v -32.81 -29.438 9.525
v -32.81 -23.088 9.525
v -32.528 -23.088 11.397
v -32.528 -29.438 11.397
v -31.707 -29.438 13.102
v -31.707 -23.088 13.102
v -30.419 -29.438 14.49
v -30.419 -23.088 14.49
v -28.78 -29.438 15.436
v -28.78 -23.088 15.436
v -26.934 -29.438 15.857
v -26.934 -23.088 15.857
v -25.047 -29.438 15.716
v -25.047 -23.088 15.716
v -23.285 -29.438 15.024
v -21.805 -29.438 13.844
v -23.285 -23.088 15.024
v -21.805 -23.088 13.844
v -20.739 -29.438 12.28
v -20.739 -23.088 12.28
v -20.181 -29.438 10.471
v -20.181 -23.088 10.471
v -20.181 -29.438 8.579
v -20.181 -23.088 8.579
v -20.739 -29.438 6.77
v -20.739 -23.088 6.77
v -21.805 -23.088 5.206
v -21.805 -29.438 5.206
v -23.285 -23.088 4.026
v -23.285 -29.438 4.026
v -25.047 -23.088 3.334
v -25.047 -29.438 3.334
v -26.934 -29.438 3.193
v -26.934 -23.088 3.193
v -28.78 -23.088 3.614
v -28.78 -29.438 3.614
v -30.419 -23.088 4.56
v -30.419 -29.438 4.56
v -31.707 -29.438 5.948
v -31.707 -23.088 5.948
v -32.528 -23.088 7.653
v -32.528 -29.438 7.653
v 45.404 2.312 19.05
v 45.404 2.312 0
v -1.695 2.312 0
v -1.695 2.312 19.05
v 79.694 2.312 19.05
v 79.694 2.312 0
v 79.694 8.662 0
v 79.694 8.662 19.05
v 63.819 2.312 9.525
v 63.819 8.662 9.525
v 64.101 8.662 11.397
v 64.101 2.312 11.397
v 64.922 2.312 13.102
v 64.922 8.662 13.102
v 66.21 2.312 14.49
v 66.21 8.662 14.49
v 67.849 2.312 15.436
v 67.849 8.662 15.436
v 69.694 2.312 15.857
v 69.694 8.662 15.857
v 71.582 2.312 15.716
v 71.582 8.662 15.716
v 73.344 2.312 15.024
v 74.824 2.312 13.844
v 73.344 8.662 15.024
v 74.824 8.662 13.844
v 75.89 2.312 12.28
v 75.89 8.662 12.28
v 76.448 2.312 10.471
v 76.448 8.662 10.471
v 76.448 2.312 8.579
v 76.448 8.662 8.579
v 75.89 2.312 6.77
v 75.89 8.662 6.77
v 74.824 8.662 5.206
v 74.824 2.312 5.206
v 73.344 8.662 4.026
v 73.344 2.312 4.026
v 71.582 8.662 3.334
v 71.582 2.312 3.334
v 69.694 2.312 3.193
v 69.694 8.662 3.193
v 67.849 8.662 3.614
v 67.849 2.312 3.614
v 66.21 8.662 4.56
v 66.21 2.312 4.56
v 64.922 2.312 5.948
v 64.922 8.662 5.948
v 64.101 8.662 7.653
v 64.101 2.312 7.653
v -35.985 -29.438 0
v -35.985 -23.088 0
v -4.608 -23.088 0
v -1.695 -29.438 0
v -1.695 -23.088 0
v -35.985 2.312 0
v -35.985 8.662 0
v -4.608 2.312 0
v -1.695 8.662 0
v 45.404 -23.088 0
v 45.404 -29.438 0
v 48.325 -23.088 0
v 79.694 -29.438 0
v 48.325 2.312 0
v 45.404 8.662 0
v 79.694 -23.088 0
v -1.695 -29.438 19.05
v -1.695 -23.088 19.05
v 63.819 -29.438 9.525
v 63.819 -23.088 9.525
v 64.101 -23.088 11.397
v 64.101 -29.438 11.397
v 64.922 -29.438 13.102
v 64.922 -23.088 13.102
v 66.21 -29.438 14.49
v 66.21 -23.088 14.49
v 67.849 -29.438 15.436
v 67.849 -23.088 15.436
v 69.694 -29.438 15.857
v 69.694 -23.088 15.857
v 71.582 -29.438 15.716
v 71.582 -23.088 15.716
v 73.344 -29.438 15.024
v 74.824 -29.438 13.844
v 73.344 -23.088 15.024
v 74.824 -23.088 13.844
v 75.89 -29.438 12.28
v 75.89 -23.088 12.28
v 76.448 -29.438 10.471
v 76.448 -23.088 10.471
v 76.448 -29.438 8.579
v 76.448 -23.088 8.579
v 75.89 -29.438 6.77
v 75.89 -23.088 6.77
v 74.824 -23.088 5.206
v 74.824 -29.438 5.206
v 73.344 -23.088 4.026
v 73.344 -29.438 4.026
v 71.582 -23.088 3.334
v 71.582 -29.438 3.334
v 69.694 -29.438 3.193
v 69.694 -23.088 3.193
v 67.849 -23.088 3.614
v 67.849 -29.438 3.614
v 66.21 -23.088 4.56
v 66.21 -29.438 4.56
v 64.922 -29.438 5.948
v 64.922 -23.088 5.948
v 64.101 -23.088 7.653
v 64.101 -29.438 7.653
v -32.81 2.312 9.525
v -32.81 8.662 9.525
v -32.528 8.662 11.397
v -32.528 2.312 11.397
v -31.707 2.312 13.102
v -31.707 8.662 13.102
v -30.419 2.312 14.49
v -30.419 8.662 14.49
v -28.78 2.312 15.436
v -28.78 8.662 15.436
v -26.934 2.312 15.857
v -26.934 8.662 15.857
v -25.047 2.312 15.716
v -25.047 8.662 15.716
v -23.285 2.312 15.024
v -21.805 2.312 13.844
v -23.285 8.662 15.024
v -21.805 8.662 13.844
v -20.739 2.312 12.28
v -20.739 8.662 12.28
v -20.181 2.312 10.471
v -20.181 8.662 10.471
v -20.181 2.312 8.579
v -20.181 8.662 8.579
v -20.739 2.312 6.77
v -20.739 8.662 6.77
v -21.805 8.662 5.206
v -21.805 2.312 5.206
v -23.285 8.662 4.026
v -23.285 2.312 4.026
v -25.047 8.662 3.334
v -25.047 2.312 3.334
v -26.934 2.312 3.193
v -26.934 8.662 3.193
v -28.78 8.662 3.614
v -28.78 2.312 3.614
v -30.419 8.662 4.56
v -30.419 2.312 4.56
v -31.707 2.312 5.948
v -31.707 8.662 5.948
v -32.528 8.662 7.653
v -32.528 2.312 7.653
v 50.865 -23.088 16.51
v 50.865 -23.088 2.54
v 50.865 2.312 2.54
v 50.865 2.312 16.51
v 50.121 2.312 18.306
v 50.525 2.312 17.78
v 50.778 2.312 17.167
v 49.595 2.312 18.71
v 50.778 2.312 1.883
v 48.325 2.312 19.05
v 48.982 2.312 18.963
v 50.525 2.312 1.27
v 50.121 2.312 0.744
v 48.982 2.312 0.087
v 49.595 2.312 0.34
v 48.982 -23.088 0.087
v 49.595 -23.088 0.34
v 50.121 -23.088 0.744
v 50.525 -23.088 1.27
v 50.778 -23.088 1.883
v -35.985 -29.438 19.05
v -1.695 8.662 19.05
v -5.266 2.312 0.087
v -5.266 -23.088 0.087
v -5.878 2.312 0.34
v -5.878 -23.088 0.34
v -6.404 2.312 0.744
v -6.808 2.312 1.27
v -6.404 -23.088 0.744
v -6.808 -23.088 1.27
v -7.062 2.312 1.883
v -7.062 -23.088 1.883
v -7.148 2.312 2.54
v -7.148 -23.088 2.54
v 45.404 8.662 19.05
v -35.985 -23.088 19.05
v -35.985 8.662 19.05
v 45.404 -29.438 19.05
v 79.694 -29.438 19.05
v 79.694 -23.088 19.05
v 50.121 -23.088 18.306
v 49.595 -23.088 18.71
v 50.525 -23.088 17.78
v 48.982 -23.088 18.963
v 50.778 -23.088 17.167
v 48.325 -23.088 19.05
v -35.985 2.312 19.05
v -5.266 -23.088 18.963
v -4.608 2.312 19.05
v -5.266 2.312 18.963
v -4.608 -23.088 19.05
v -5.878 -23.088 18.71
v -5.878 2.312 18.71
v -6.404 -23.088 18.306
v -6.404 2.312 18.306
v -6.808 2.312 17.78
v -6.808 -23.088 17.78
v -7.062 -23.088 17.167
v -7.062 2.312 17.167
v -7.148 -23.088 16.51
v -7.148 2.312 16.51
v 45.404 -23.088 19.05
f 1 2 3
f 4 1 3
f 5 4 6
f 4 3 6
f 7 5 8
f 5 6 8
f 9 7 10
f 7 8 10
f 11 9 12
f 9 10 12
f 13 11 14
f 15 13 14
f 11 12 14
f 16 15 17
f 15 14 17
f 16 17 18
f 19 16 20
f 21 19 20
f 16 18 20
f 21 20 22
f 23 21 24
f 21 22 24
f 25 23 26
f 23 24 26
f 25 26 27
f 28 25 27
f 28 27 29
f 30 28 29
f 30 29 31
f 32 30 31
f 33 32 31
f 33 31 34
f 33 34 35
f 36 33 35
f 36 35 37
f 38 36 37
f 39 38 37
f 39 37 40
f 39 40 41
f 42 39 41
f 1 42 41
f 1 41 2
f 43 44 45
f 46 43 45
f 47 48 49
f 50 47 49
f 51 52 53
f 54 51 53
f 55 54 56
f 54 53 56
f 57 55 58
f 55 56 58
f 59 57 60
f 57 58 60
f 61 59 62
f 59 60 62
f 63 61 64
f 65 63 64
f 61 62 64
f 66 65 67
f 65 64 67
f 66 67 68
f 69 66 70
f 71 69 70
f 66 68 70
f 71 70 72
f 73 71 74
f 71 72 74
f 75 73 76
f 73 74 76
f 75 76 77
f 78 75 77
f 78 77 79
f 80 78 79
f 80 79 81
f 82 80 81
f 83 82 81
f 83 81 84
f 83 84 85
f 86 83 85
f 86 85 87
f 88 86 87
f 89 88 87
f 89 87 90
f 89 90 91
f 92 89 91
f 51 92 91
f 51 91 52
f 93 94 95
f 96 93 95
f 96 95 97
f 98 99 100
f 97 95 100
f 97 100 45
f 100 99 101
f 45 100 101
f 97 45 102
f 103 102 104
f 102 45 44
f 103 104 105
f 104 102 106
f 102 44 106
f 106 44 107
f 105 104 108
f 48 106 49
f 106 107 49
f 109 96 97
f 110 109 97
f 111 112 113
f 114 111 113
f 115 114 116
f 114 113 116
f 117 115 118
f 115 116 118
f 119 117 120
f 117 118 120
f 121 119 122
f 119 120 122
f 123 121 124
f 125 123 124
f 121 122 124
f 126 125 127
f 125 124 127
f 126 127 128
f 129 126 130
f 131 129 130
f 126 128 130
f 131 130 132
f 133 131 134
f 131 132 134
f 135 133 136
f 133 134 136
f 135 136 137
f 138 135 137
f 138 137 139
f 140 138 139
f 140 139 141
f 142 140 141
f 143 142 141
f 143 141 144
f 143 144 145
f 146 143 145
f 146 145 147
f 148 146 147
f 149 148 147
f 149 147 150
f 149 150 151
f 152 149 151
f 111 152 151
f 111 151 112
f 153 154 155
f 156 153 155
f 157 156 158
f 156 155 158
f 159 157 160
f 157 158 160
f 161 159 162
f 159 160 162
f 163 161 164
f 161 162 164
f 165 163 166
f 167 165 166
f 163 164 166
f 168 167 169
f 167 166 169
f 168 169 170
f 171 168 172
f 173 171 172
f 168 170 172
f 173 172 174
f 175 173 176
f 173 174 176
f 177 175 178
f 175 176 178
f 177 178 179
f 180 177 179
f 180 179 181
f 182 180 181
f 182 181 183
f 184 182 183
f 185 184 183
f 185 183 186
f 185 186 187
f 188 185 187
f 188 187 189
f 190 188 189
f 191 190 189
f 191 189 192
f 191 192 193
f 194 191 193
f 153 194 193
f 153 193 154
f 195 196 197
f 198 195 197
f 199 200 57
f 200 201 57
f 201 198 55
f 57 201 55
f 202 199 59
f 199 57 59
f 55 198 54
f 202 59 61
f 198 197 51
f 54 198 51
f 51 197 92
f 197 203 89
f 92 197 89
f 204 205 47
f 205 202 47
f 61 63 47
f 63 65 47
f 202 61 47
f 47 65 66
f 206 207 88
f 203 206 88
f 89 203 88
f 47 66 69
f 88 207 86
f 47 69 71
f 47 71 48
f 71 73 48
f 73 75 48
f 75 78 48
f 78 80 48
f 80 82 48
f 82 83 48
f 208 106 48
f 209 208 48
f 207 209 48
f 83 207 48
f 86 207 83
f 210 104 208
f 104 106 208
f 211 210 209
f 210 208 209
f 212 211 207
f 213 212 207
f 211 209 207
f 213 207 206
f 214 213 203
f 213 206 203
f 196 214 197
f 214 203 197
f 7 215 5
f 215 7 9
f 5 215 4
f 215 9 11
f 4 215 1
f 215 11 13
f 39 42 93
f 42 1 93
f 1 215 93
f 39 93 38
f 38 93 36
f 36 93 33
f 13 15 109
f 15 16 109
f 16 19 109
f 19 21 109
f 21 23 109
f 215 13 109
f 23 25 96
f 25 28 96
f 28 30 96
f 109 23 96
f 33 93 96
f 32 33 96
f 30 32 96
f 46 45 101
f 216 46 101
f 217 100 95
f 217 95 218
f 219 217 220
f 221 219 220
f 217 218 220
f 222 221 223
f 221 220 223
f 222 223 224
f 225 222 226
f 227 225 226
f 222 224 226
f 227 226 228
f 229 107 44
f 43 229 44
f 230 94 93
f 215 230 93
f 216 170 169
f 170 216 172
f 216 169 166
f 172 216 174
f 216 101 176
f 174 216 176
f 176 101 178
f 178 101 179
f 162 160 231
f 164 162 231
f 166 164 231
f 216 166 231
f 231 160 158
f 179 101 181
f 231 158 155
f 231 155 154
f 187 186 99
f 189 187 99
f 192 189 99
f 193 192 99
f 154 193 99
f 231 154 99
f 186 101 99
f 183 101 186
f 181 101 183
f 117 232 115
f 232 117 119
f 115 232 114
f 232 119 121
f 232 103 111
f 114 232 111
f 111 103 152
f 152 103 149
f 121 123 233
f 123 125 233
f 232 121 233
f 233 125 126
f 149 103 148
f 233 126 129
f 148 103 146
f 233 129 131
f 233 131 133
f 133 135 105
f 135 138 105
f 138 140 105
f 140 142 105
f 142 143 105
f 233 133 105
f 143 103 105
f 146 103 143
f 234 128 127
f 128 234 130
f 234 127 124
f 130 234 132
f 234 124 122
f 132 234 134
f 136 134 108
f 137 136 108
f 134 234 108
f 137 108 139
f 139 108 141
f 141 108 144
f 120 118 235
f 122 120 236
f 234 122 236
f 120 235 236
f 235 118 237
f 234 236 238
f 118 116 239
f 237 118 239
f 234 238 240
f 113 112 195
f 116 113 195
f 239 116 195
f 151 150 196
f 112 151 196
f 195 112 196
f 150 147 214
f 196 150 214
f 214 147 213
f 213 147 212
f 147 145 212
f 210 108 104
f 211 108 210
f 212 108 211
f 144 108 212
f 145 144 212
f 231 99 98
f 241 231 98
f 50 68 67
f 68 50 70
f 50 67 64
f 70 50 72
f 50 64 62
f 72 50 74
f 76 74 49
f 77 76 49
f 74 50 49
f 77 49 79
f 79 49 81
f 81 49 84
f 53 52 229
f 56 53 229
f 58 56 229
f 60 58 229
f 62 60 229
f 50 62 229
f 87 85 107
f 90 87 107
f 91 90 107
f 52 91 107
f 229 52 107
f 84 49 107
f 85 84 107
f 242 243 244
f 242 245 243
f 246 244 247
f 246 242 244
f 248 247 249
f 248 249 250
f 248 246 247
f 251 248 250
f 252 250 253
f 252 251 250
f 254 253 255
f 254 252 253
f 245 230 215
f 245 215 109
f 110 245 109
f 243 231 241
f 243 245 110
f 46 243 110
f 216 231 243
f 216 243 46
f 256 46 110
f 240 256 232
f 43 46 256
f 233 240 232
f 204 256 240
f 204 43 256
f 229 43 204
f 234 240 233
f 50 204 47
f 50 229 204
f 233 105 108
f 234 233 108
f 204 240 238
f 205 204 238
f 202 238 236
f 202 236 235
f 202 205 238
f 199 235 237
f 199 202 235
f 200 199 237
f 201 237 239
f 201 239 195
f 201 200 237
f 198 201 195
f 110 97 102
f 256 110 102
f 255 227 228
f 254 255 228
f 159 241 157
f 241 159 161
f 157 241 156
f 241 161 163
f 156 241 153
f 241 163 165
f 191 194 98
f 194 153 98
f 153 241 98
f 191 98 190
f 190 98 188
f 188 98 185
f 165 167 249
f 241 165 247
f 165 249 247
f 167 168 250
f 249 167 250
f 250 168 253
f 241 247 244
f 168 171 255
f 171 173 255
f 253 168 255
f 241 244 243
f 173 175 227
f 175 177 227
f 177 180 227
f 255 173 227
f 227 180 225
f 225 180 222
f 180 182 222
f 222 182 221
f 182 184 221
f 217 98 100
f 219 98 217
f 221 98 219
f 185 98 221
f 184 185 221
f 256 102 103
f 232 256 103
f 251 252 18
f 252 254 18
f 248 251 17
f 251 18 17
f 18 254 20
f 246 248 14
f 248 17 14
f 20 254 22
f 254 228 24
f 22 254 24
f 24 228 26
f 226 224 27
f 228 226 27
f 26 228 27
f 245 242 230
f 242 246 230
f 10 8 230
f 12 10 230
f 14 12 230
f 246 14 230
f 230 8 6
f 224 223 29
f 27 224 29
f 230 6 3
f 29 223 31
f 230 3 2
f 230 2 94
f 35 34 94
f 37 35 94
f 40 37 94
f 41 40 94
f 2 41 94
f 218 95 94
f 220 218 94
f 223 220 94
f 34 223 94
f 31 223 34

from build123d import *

# Parameters (mm, degrees)
F1_DEPTH = 19.05
F3_D     = 12.7
F5_D     = 12.7
F6_R     = 2.54


with BuildPart() as f1:
    # F0 (on Top) → F1 (new body)
    with BuildSketch(Plane.XY):
        Polygon((45.404016, 2.31187), (-1.694917, 2.31187), (-1.694917, 8.66187), (-35.984917, 8.66187), (-35.984917, 2.31187), (-7.148128, 2.31187), (-7.148128, -23.08813), (-35.984917, -23.08813), (-35.984917, -29.43813), (-1.694917, -29.43813), (-1.694917, -23.08813), (45.404016, -23.08813), (45.404016, -29.43813), (79.694016, -29.43813), (79.694016, -23.08813), (50.865016, -23.08813), (50.865016, 2.31187), (79.694016, 2.31187), (79.694016, 8.66187), (45.404016, 8.66187), align=None)
    extrude(amount=F1_DEPTH)

    # F3 (through all)
    with Locations(Plane.XZ.offset(29.43813)):
        with Locations((-26.459917, 9.525)):
            Hole(F3_D / 2)

    # F5 (through all)
    with Locations(Plane.XZ.offset(29.43813)):
        with Locations((70.169016, 9.525)):
            Hole(F5_D / 2)

    # F6
    f6_edges = [f1.edges().sort_by_distance(p)[0] for p in [
        (50.865016, -10.38813, 19.05),
        (50.865016, -10.38813, 0),
        (-7.148128, -10.38813, 19.05),
        (-7.148128, -10.38813, 0),
    ]]
    fillet(f6_edges, radius=F6_R)


solid = f1.part
